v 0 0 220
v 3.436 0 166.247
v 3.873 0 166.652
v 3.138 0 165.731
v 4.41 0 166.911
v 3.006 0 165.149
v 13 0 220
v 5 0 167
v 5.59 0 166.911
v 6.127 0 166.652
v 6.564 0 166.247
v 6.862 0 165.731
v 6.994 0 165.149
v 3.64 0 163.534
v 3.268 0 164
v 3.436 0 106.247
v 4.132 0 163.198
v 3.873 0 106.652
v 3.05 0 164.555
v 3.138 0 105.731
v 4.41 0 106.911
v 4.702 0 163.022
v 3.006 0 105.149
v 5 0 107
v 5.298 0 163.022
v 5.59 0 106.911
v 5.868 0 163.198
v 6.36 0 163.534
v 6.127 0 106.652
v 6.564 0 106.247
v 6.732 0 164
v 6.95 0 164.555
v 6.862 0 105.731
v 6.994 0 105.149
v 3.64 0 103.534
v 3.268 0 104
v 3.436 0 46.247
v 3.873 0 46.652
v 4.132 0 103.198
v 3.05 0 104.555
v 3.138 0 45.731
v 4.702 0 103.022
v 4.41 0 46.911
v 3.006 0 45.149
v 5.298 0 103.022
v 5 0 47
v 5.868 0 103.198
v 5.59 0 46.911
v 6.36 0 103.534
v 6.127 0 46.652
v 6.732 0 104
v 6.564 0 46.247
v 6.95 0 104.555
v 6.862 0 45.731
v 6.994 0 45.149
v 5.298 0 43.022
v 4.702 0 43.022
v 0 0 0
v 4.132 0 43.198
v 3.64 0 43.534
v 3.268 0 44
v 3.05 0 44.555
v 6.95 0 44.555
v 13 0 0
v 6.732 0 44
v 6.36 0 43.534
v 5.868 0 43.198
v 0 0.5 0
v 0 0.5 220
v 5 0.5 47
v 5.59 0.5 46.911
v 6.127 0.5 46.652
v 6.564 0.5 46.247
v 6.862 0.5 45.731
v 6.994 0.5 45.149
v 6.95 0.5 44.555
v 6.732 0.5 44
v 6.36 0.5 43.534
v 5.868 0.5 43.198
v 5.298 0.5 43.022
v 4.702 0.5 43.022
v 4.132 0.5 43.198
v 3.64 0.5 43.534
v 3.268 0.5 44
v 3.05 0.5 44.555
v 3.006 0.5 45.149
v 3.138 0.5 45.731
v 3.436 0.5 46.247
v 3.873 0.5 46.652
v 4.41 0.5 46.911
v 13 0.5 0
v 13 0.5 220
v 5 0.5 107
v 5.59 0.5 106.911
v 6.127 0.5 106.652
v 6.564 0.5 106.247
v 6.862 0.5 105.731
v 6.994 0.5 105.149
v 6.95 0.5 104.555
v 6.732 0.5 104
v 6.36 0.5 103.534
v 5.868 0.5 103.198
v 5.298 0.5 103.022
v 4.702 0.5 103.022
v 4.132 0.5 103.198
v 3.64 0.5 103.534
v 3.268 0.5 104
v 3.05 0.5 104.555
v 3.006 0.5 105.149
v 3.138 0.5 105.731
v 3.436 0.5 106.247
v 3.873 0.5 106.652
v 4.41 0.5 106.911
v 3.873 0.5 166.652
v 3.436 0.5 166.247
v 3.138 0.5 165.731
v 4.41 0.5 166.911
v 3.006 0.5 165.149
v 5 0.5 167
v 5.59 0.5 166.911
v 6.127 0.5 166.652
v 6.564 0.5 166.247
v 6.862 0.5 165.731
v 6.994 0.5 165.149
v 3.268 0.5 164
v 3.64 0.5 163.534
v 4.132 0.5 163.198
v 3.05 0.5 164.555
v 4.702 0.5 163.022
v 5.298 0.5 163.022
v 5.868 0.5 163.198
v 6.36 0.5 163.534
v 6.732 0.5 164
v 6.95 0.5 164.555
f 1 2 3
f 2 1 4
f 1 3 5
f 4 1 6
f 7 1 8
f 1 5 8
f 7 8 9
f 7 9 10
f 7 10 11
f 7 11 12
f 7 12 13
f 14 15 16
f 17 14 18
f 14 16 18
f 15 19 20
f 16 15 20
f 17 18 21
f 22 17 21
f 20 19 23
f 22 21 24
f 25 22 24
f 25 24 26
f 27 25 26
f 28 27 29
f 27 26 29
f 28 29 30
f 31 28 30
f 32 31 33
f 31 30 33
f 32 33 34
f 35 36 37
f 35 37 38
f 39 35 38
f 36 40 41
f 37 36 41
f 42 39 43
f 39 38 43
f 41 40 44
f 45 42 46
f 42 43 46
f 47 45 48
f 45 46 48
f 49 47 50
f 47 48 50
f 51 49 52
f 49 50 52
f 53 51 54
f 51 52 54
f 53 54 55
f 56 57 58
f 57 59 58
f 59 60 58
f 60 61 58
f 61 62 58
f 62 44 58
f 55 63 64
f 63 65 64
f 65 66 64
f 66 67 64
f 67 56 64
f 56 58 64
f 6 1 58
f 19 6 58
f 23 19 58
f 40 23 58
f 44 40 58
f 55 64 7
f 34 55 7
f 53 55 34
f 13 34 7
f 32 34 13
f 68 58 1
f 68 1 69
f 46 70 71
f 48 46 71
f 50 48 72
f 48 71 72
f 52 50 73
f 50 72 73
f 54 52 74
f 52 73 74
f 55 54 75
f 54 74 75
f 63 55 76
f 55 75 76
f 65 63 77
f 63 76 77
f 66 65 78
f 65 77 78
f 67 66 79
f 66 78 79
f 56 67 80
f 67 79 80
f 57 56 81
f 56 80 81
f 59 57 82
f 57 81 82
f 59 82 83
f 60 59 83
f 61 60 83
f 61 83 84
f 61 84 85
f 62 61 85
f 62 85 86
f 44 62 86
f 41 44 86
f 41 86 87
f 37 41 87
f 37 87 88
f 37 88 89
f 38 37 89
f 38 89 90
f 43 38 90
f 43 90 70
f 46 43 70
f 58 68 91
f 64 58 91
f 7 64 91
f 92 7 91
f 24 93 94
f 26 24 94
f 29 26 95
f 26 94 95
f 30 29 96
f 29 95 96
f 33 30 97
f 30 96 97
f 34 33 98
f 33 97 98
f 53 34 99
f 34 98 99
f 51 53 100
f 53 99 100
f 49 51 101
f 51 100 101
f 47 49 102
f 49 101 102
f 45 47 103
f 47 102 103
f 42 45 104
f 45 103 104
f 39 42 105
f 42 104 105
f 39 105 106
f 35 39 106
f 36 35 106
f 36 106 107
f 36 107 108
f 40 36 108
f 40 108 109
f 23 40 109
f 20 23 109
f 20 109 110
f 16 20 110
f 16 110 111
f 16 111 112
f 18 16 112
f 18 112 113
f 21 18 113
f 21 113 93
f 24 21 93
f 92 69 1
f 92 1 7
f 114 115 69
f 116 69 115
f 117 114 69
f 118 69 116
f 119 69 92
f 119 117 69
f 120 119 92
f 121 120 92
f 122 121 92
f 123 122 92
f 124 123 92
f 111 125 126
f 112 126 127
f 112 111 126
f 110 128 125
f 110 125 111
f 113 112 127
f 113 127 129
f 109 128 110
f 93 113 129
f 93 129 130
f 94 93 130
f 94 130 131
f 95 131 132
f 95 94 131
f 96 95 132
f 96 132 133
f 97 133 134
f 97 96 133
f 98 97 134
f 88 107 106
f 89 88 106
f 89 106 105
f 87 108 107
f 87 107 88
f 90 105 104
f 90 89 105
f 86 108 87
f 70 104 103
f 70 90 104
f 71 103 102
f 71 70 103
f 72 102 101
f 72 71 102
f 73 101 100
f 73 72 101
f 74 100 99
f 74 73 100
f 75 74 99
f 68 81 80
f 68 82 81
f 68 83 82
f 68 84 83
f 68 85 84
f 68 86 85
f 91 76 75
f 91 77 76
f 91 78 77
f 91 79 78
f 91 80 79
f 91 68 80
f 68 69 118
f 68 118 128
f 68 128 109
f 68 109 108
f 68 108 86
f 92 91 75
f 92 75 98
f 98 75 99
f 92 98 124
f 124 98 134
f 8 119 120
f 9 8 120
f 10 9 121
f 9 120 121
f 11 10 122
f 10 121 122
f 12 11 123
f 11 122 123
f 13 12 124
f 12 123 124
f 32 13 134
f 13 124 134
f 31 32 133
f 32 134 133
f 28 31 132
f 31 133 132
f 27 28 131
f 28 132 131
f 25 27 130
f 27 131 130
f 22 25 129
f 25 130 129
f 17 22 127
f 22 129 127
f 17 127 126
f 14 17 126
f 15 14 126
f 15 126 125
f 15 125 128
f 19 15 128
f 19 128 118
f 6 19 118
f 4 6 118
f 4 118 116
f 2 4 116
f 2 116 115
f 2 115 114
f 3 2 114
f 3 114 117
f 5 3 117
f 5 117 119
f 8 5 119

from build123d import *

# Parameters (mm, degrees)
ESQUISSE1_W             = 13
ESQUISSE1_H             = 0.5
BOSS_EXTRU_1_DEPTH      = 220
ENL_V_MAT_EXTRU_1_REACH = 222.384
ESQUISSE2_R             = 2


with BuildPart() as part:
    # Esquisse1 → Boss.-Extru.1 (new body)
    with BuildSketch(Plane.XY):
        with Locations((6.5, 0.25)):
            Rectangle(ESQUISSE1_W, ESQUISSE1_H)
    extrude(amount=BOSS_EXTRU_1_DEPTH)

    # Esquisse2 → Enlèv. mat.-Extru.1 (cut, up to next)
    with BuildSketch(Plane(origin=(0, 0.5, 0), x_dir=(1, 0, 0), z_dir=(0, 1, 0)), mode=Mode.PRIVATE) as enl_v_mat_extru_1_sk1:
        with Locations(Location((5, -45, 0), (0, 0, 270))):
            Circle(ESQUISSE2_R)
    enl_v_mat_extru_1_tool1 = extrude(enl_v_mat_extru_1_sk1.sketch, amount=-ENL_V_MAT_EXTRU_1_REACH, mode=Mode.PRIVATE) & part.part
    # Esquisse2 → Enlèv. mat.-Extru.1 (cut, up to next)
    with BuildSketch(Plane(origin=(0, 0.5, 0), x_dir=(1, 0, 0), z_dir=(0, 1, 0)), mode=Mode.PRIVATE) as enl_v_mat_extru_1_sk2:
        with Locations(Location((5, -105, 0), (0, 0, 270))):
            Circle(ESQUISSE2_R)
    enl_v_mat_extru_1_tool2 = extrude(enl_v_mat_extru_1_sk2.sketch, amount=-ENL_V_MAT_EXTRU_1_REACH, mode=Mode.PRIVATE) & part.part
    # Esquisse2 → Enlèv. mat.-Extru.1 (cut, up to next)
    with BuildSketch(Plane(origin=(0, 0.5, 0), x_dir=(1, 0, 0), z_dir=(0, 1, 0)), mode=Mode.PRIVATE) as enl_v_mat_extru_1_sk3:
        with Locations(Location((5, -165, 0), (0, 0, 270))):
            Circle(ESQUISSE2_R)
    enl_v_mat_extru_1_tool3 = extrude(enl_v_mat_extru_1_sk3.sketch, amount=-ENL_V_MAT_EXTRU_1_REACH, mode=Mode.PRIVATE) & part.part
    add(enl_v_mat_extru_1_tool1.solids().sort_by_distance((5, 0.5, 45))[0], mode=Mode.SUBTRACT)
    add(enl_v_mat_extru_1_tool2.solids().sort_by_distance((5, 0.5, 105))[0], mode=Mode.SUBTRACT)
    add(enl_v_mat_extru_1_tool3.solids().sort_by_distance((5, 0.5, 165))[0], mode=Mode.SUBTRACT)


solid = part.part
